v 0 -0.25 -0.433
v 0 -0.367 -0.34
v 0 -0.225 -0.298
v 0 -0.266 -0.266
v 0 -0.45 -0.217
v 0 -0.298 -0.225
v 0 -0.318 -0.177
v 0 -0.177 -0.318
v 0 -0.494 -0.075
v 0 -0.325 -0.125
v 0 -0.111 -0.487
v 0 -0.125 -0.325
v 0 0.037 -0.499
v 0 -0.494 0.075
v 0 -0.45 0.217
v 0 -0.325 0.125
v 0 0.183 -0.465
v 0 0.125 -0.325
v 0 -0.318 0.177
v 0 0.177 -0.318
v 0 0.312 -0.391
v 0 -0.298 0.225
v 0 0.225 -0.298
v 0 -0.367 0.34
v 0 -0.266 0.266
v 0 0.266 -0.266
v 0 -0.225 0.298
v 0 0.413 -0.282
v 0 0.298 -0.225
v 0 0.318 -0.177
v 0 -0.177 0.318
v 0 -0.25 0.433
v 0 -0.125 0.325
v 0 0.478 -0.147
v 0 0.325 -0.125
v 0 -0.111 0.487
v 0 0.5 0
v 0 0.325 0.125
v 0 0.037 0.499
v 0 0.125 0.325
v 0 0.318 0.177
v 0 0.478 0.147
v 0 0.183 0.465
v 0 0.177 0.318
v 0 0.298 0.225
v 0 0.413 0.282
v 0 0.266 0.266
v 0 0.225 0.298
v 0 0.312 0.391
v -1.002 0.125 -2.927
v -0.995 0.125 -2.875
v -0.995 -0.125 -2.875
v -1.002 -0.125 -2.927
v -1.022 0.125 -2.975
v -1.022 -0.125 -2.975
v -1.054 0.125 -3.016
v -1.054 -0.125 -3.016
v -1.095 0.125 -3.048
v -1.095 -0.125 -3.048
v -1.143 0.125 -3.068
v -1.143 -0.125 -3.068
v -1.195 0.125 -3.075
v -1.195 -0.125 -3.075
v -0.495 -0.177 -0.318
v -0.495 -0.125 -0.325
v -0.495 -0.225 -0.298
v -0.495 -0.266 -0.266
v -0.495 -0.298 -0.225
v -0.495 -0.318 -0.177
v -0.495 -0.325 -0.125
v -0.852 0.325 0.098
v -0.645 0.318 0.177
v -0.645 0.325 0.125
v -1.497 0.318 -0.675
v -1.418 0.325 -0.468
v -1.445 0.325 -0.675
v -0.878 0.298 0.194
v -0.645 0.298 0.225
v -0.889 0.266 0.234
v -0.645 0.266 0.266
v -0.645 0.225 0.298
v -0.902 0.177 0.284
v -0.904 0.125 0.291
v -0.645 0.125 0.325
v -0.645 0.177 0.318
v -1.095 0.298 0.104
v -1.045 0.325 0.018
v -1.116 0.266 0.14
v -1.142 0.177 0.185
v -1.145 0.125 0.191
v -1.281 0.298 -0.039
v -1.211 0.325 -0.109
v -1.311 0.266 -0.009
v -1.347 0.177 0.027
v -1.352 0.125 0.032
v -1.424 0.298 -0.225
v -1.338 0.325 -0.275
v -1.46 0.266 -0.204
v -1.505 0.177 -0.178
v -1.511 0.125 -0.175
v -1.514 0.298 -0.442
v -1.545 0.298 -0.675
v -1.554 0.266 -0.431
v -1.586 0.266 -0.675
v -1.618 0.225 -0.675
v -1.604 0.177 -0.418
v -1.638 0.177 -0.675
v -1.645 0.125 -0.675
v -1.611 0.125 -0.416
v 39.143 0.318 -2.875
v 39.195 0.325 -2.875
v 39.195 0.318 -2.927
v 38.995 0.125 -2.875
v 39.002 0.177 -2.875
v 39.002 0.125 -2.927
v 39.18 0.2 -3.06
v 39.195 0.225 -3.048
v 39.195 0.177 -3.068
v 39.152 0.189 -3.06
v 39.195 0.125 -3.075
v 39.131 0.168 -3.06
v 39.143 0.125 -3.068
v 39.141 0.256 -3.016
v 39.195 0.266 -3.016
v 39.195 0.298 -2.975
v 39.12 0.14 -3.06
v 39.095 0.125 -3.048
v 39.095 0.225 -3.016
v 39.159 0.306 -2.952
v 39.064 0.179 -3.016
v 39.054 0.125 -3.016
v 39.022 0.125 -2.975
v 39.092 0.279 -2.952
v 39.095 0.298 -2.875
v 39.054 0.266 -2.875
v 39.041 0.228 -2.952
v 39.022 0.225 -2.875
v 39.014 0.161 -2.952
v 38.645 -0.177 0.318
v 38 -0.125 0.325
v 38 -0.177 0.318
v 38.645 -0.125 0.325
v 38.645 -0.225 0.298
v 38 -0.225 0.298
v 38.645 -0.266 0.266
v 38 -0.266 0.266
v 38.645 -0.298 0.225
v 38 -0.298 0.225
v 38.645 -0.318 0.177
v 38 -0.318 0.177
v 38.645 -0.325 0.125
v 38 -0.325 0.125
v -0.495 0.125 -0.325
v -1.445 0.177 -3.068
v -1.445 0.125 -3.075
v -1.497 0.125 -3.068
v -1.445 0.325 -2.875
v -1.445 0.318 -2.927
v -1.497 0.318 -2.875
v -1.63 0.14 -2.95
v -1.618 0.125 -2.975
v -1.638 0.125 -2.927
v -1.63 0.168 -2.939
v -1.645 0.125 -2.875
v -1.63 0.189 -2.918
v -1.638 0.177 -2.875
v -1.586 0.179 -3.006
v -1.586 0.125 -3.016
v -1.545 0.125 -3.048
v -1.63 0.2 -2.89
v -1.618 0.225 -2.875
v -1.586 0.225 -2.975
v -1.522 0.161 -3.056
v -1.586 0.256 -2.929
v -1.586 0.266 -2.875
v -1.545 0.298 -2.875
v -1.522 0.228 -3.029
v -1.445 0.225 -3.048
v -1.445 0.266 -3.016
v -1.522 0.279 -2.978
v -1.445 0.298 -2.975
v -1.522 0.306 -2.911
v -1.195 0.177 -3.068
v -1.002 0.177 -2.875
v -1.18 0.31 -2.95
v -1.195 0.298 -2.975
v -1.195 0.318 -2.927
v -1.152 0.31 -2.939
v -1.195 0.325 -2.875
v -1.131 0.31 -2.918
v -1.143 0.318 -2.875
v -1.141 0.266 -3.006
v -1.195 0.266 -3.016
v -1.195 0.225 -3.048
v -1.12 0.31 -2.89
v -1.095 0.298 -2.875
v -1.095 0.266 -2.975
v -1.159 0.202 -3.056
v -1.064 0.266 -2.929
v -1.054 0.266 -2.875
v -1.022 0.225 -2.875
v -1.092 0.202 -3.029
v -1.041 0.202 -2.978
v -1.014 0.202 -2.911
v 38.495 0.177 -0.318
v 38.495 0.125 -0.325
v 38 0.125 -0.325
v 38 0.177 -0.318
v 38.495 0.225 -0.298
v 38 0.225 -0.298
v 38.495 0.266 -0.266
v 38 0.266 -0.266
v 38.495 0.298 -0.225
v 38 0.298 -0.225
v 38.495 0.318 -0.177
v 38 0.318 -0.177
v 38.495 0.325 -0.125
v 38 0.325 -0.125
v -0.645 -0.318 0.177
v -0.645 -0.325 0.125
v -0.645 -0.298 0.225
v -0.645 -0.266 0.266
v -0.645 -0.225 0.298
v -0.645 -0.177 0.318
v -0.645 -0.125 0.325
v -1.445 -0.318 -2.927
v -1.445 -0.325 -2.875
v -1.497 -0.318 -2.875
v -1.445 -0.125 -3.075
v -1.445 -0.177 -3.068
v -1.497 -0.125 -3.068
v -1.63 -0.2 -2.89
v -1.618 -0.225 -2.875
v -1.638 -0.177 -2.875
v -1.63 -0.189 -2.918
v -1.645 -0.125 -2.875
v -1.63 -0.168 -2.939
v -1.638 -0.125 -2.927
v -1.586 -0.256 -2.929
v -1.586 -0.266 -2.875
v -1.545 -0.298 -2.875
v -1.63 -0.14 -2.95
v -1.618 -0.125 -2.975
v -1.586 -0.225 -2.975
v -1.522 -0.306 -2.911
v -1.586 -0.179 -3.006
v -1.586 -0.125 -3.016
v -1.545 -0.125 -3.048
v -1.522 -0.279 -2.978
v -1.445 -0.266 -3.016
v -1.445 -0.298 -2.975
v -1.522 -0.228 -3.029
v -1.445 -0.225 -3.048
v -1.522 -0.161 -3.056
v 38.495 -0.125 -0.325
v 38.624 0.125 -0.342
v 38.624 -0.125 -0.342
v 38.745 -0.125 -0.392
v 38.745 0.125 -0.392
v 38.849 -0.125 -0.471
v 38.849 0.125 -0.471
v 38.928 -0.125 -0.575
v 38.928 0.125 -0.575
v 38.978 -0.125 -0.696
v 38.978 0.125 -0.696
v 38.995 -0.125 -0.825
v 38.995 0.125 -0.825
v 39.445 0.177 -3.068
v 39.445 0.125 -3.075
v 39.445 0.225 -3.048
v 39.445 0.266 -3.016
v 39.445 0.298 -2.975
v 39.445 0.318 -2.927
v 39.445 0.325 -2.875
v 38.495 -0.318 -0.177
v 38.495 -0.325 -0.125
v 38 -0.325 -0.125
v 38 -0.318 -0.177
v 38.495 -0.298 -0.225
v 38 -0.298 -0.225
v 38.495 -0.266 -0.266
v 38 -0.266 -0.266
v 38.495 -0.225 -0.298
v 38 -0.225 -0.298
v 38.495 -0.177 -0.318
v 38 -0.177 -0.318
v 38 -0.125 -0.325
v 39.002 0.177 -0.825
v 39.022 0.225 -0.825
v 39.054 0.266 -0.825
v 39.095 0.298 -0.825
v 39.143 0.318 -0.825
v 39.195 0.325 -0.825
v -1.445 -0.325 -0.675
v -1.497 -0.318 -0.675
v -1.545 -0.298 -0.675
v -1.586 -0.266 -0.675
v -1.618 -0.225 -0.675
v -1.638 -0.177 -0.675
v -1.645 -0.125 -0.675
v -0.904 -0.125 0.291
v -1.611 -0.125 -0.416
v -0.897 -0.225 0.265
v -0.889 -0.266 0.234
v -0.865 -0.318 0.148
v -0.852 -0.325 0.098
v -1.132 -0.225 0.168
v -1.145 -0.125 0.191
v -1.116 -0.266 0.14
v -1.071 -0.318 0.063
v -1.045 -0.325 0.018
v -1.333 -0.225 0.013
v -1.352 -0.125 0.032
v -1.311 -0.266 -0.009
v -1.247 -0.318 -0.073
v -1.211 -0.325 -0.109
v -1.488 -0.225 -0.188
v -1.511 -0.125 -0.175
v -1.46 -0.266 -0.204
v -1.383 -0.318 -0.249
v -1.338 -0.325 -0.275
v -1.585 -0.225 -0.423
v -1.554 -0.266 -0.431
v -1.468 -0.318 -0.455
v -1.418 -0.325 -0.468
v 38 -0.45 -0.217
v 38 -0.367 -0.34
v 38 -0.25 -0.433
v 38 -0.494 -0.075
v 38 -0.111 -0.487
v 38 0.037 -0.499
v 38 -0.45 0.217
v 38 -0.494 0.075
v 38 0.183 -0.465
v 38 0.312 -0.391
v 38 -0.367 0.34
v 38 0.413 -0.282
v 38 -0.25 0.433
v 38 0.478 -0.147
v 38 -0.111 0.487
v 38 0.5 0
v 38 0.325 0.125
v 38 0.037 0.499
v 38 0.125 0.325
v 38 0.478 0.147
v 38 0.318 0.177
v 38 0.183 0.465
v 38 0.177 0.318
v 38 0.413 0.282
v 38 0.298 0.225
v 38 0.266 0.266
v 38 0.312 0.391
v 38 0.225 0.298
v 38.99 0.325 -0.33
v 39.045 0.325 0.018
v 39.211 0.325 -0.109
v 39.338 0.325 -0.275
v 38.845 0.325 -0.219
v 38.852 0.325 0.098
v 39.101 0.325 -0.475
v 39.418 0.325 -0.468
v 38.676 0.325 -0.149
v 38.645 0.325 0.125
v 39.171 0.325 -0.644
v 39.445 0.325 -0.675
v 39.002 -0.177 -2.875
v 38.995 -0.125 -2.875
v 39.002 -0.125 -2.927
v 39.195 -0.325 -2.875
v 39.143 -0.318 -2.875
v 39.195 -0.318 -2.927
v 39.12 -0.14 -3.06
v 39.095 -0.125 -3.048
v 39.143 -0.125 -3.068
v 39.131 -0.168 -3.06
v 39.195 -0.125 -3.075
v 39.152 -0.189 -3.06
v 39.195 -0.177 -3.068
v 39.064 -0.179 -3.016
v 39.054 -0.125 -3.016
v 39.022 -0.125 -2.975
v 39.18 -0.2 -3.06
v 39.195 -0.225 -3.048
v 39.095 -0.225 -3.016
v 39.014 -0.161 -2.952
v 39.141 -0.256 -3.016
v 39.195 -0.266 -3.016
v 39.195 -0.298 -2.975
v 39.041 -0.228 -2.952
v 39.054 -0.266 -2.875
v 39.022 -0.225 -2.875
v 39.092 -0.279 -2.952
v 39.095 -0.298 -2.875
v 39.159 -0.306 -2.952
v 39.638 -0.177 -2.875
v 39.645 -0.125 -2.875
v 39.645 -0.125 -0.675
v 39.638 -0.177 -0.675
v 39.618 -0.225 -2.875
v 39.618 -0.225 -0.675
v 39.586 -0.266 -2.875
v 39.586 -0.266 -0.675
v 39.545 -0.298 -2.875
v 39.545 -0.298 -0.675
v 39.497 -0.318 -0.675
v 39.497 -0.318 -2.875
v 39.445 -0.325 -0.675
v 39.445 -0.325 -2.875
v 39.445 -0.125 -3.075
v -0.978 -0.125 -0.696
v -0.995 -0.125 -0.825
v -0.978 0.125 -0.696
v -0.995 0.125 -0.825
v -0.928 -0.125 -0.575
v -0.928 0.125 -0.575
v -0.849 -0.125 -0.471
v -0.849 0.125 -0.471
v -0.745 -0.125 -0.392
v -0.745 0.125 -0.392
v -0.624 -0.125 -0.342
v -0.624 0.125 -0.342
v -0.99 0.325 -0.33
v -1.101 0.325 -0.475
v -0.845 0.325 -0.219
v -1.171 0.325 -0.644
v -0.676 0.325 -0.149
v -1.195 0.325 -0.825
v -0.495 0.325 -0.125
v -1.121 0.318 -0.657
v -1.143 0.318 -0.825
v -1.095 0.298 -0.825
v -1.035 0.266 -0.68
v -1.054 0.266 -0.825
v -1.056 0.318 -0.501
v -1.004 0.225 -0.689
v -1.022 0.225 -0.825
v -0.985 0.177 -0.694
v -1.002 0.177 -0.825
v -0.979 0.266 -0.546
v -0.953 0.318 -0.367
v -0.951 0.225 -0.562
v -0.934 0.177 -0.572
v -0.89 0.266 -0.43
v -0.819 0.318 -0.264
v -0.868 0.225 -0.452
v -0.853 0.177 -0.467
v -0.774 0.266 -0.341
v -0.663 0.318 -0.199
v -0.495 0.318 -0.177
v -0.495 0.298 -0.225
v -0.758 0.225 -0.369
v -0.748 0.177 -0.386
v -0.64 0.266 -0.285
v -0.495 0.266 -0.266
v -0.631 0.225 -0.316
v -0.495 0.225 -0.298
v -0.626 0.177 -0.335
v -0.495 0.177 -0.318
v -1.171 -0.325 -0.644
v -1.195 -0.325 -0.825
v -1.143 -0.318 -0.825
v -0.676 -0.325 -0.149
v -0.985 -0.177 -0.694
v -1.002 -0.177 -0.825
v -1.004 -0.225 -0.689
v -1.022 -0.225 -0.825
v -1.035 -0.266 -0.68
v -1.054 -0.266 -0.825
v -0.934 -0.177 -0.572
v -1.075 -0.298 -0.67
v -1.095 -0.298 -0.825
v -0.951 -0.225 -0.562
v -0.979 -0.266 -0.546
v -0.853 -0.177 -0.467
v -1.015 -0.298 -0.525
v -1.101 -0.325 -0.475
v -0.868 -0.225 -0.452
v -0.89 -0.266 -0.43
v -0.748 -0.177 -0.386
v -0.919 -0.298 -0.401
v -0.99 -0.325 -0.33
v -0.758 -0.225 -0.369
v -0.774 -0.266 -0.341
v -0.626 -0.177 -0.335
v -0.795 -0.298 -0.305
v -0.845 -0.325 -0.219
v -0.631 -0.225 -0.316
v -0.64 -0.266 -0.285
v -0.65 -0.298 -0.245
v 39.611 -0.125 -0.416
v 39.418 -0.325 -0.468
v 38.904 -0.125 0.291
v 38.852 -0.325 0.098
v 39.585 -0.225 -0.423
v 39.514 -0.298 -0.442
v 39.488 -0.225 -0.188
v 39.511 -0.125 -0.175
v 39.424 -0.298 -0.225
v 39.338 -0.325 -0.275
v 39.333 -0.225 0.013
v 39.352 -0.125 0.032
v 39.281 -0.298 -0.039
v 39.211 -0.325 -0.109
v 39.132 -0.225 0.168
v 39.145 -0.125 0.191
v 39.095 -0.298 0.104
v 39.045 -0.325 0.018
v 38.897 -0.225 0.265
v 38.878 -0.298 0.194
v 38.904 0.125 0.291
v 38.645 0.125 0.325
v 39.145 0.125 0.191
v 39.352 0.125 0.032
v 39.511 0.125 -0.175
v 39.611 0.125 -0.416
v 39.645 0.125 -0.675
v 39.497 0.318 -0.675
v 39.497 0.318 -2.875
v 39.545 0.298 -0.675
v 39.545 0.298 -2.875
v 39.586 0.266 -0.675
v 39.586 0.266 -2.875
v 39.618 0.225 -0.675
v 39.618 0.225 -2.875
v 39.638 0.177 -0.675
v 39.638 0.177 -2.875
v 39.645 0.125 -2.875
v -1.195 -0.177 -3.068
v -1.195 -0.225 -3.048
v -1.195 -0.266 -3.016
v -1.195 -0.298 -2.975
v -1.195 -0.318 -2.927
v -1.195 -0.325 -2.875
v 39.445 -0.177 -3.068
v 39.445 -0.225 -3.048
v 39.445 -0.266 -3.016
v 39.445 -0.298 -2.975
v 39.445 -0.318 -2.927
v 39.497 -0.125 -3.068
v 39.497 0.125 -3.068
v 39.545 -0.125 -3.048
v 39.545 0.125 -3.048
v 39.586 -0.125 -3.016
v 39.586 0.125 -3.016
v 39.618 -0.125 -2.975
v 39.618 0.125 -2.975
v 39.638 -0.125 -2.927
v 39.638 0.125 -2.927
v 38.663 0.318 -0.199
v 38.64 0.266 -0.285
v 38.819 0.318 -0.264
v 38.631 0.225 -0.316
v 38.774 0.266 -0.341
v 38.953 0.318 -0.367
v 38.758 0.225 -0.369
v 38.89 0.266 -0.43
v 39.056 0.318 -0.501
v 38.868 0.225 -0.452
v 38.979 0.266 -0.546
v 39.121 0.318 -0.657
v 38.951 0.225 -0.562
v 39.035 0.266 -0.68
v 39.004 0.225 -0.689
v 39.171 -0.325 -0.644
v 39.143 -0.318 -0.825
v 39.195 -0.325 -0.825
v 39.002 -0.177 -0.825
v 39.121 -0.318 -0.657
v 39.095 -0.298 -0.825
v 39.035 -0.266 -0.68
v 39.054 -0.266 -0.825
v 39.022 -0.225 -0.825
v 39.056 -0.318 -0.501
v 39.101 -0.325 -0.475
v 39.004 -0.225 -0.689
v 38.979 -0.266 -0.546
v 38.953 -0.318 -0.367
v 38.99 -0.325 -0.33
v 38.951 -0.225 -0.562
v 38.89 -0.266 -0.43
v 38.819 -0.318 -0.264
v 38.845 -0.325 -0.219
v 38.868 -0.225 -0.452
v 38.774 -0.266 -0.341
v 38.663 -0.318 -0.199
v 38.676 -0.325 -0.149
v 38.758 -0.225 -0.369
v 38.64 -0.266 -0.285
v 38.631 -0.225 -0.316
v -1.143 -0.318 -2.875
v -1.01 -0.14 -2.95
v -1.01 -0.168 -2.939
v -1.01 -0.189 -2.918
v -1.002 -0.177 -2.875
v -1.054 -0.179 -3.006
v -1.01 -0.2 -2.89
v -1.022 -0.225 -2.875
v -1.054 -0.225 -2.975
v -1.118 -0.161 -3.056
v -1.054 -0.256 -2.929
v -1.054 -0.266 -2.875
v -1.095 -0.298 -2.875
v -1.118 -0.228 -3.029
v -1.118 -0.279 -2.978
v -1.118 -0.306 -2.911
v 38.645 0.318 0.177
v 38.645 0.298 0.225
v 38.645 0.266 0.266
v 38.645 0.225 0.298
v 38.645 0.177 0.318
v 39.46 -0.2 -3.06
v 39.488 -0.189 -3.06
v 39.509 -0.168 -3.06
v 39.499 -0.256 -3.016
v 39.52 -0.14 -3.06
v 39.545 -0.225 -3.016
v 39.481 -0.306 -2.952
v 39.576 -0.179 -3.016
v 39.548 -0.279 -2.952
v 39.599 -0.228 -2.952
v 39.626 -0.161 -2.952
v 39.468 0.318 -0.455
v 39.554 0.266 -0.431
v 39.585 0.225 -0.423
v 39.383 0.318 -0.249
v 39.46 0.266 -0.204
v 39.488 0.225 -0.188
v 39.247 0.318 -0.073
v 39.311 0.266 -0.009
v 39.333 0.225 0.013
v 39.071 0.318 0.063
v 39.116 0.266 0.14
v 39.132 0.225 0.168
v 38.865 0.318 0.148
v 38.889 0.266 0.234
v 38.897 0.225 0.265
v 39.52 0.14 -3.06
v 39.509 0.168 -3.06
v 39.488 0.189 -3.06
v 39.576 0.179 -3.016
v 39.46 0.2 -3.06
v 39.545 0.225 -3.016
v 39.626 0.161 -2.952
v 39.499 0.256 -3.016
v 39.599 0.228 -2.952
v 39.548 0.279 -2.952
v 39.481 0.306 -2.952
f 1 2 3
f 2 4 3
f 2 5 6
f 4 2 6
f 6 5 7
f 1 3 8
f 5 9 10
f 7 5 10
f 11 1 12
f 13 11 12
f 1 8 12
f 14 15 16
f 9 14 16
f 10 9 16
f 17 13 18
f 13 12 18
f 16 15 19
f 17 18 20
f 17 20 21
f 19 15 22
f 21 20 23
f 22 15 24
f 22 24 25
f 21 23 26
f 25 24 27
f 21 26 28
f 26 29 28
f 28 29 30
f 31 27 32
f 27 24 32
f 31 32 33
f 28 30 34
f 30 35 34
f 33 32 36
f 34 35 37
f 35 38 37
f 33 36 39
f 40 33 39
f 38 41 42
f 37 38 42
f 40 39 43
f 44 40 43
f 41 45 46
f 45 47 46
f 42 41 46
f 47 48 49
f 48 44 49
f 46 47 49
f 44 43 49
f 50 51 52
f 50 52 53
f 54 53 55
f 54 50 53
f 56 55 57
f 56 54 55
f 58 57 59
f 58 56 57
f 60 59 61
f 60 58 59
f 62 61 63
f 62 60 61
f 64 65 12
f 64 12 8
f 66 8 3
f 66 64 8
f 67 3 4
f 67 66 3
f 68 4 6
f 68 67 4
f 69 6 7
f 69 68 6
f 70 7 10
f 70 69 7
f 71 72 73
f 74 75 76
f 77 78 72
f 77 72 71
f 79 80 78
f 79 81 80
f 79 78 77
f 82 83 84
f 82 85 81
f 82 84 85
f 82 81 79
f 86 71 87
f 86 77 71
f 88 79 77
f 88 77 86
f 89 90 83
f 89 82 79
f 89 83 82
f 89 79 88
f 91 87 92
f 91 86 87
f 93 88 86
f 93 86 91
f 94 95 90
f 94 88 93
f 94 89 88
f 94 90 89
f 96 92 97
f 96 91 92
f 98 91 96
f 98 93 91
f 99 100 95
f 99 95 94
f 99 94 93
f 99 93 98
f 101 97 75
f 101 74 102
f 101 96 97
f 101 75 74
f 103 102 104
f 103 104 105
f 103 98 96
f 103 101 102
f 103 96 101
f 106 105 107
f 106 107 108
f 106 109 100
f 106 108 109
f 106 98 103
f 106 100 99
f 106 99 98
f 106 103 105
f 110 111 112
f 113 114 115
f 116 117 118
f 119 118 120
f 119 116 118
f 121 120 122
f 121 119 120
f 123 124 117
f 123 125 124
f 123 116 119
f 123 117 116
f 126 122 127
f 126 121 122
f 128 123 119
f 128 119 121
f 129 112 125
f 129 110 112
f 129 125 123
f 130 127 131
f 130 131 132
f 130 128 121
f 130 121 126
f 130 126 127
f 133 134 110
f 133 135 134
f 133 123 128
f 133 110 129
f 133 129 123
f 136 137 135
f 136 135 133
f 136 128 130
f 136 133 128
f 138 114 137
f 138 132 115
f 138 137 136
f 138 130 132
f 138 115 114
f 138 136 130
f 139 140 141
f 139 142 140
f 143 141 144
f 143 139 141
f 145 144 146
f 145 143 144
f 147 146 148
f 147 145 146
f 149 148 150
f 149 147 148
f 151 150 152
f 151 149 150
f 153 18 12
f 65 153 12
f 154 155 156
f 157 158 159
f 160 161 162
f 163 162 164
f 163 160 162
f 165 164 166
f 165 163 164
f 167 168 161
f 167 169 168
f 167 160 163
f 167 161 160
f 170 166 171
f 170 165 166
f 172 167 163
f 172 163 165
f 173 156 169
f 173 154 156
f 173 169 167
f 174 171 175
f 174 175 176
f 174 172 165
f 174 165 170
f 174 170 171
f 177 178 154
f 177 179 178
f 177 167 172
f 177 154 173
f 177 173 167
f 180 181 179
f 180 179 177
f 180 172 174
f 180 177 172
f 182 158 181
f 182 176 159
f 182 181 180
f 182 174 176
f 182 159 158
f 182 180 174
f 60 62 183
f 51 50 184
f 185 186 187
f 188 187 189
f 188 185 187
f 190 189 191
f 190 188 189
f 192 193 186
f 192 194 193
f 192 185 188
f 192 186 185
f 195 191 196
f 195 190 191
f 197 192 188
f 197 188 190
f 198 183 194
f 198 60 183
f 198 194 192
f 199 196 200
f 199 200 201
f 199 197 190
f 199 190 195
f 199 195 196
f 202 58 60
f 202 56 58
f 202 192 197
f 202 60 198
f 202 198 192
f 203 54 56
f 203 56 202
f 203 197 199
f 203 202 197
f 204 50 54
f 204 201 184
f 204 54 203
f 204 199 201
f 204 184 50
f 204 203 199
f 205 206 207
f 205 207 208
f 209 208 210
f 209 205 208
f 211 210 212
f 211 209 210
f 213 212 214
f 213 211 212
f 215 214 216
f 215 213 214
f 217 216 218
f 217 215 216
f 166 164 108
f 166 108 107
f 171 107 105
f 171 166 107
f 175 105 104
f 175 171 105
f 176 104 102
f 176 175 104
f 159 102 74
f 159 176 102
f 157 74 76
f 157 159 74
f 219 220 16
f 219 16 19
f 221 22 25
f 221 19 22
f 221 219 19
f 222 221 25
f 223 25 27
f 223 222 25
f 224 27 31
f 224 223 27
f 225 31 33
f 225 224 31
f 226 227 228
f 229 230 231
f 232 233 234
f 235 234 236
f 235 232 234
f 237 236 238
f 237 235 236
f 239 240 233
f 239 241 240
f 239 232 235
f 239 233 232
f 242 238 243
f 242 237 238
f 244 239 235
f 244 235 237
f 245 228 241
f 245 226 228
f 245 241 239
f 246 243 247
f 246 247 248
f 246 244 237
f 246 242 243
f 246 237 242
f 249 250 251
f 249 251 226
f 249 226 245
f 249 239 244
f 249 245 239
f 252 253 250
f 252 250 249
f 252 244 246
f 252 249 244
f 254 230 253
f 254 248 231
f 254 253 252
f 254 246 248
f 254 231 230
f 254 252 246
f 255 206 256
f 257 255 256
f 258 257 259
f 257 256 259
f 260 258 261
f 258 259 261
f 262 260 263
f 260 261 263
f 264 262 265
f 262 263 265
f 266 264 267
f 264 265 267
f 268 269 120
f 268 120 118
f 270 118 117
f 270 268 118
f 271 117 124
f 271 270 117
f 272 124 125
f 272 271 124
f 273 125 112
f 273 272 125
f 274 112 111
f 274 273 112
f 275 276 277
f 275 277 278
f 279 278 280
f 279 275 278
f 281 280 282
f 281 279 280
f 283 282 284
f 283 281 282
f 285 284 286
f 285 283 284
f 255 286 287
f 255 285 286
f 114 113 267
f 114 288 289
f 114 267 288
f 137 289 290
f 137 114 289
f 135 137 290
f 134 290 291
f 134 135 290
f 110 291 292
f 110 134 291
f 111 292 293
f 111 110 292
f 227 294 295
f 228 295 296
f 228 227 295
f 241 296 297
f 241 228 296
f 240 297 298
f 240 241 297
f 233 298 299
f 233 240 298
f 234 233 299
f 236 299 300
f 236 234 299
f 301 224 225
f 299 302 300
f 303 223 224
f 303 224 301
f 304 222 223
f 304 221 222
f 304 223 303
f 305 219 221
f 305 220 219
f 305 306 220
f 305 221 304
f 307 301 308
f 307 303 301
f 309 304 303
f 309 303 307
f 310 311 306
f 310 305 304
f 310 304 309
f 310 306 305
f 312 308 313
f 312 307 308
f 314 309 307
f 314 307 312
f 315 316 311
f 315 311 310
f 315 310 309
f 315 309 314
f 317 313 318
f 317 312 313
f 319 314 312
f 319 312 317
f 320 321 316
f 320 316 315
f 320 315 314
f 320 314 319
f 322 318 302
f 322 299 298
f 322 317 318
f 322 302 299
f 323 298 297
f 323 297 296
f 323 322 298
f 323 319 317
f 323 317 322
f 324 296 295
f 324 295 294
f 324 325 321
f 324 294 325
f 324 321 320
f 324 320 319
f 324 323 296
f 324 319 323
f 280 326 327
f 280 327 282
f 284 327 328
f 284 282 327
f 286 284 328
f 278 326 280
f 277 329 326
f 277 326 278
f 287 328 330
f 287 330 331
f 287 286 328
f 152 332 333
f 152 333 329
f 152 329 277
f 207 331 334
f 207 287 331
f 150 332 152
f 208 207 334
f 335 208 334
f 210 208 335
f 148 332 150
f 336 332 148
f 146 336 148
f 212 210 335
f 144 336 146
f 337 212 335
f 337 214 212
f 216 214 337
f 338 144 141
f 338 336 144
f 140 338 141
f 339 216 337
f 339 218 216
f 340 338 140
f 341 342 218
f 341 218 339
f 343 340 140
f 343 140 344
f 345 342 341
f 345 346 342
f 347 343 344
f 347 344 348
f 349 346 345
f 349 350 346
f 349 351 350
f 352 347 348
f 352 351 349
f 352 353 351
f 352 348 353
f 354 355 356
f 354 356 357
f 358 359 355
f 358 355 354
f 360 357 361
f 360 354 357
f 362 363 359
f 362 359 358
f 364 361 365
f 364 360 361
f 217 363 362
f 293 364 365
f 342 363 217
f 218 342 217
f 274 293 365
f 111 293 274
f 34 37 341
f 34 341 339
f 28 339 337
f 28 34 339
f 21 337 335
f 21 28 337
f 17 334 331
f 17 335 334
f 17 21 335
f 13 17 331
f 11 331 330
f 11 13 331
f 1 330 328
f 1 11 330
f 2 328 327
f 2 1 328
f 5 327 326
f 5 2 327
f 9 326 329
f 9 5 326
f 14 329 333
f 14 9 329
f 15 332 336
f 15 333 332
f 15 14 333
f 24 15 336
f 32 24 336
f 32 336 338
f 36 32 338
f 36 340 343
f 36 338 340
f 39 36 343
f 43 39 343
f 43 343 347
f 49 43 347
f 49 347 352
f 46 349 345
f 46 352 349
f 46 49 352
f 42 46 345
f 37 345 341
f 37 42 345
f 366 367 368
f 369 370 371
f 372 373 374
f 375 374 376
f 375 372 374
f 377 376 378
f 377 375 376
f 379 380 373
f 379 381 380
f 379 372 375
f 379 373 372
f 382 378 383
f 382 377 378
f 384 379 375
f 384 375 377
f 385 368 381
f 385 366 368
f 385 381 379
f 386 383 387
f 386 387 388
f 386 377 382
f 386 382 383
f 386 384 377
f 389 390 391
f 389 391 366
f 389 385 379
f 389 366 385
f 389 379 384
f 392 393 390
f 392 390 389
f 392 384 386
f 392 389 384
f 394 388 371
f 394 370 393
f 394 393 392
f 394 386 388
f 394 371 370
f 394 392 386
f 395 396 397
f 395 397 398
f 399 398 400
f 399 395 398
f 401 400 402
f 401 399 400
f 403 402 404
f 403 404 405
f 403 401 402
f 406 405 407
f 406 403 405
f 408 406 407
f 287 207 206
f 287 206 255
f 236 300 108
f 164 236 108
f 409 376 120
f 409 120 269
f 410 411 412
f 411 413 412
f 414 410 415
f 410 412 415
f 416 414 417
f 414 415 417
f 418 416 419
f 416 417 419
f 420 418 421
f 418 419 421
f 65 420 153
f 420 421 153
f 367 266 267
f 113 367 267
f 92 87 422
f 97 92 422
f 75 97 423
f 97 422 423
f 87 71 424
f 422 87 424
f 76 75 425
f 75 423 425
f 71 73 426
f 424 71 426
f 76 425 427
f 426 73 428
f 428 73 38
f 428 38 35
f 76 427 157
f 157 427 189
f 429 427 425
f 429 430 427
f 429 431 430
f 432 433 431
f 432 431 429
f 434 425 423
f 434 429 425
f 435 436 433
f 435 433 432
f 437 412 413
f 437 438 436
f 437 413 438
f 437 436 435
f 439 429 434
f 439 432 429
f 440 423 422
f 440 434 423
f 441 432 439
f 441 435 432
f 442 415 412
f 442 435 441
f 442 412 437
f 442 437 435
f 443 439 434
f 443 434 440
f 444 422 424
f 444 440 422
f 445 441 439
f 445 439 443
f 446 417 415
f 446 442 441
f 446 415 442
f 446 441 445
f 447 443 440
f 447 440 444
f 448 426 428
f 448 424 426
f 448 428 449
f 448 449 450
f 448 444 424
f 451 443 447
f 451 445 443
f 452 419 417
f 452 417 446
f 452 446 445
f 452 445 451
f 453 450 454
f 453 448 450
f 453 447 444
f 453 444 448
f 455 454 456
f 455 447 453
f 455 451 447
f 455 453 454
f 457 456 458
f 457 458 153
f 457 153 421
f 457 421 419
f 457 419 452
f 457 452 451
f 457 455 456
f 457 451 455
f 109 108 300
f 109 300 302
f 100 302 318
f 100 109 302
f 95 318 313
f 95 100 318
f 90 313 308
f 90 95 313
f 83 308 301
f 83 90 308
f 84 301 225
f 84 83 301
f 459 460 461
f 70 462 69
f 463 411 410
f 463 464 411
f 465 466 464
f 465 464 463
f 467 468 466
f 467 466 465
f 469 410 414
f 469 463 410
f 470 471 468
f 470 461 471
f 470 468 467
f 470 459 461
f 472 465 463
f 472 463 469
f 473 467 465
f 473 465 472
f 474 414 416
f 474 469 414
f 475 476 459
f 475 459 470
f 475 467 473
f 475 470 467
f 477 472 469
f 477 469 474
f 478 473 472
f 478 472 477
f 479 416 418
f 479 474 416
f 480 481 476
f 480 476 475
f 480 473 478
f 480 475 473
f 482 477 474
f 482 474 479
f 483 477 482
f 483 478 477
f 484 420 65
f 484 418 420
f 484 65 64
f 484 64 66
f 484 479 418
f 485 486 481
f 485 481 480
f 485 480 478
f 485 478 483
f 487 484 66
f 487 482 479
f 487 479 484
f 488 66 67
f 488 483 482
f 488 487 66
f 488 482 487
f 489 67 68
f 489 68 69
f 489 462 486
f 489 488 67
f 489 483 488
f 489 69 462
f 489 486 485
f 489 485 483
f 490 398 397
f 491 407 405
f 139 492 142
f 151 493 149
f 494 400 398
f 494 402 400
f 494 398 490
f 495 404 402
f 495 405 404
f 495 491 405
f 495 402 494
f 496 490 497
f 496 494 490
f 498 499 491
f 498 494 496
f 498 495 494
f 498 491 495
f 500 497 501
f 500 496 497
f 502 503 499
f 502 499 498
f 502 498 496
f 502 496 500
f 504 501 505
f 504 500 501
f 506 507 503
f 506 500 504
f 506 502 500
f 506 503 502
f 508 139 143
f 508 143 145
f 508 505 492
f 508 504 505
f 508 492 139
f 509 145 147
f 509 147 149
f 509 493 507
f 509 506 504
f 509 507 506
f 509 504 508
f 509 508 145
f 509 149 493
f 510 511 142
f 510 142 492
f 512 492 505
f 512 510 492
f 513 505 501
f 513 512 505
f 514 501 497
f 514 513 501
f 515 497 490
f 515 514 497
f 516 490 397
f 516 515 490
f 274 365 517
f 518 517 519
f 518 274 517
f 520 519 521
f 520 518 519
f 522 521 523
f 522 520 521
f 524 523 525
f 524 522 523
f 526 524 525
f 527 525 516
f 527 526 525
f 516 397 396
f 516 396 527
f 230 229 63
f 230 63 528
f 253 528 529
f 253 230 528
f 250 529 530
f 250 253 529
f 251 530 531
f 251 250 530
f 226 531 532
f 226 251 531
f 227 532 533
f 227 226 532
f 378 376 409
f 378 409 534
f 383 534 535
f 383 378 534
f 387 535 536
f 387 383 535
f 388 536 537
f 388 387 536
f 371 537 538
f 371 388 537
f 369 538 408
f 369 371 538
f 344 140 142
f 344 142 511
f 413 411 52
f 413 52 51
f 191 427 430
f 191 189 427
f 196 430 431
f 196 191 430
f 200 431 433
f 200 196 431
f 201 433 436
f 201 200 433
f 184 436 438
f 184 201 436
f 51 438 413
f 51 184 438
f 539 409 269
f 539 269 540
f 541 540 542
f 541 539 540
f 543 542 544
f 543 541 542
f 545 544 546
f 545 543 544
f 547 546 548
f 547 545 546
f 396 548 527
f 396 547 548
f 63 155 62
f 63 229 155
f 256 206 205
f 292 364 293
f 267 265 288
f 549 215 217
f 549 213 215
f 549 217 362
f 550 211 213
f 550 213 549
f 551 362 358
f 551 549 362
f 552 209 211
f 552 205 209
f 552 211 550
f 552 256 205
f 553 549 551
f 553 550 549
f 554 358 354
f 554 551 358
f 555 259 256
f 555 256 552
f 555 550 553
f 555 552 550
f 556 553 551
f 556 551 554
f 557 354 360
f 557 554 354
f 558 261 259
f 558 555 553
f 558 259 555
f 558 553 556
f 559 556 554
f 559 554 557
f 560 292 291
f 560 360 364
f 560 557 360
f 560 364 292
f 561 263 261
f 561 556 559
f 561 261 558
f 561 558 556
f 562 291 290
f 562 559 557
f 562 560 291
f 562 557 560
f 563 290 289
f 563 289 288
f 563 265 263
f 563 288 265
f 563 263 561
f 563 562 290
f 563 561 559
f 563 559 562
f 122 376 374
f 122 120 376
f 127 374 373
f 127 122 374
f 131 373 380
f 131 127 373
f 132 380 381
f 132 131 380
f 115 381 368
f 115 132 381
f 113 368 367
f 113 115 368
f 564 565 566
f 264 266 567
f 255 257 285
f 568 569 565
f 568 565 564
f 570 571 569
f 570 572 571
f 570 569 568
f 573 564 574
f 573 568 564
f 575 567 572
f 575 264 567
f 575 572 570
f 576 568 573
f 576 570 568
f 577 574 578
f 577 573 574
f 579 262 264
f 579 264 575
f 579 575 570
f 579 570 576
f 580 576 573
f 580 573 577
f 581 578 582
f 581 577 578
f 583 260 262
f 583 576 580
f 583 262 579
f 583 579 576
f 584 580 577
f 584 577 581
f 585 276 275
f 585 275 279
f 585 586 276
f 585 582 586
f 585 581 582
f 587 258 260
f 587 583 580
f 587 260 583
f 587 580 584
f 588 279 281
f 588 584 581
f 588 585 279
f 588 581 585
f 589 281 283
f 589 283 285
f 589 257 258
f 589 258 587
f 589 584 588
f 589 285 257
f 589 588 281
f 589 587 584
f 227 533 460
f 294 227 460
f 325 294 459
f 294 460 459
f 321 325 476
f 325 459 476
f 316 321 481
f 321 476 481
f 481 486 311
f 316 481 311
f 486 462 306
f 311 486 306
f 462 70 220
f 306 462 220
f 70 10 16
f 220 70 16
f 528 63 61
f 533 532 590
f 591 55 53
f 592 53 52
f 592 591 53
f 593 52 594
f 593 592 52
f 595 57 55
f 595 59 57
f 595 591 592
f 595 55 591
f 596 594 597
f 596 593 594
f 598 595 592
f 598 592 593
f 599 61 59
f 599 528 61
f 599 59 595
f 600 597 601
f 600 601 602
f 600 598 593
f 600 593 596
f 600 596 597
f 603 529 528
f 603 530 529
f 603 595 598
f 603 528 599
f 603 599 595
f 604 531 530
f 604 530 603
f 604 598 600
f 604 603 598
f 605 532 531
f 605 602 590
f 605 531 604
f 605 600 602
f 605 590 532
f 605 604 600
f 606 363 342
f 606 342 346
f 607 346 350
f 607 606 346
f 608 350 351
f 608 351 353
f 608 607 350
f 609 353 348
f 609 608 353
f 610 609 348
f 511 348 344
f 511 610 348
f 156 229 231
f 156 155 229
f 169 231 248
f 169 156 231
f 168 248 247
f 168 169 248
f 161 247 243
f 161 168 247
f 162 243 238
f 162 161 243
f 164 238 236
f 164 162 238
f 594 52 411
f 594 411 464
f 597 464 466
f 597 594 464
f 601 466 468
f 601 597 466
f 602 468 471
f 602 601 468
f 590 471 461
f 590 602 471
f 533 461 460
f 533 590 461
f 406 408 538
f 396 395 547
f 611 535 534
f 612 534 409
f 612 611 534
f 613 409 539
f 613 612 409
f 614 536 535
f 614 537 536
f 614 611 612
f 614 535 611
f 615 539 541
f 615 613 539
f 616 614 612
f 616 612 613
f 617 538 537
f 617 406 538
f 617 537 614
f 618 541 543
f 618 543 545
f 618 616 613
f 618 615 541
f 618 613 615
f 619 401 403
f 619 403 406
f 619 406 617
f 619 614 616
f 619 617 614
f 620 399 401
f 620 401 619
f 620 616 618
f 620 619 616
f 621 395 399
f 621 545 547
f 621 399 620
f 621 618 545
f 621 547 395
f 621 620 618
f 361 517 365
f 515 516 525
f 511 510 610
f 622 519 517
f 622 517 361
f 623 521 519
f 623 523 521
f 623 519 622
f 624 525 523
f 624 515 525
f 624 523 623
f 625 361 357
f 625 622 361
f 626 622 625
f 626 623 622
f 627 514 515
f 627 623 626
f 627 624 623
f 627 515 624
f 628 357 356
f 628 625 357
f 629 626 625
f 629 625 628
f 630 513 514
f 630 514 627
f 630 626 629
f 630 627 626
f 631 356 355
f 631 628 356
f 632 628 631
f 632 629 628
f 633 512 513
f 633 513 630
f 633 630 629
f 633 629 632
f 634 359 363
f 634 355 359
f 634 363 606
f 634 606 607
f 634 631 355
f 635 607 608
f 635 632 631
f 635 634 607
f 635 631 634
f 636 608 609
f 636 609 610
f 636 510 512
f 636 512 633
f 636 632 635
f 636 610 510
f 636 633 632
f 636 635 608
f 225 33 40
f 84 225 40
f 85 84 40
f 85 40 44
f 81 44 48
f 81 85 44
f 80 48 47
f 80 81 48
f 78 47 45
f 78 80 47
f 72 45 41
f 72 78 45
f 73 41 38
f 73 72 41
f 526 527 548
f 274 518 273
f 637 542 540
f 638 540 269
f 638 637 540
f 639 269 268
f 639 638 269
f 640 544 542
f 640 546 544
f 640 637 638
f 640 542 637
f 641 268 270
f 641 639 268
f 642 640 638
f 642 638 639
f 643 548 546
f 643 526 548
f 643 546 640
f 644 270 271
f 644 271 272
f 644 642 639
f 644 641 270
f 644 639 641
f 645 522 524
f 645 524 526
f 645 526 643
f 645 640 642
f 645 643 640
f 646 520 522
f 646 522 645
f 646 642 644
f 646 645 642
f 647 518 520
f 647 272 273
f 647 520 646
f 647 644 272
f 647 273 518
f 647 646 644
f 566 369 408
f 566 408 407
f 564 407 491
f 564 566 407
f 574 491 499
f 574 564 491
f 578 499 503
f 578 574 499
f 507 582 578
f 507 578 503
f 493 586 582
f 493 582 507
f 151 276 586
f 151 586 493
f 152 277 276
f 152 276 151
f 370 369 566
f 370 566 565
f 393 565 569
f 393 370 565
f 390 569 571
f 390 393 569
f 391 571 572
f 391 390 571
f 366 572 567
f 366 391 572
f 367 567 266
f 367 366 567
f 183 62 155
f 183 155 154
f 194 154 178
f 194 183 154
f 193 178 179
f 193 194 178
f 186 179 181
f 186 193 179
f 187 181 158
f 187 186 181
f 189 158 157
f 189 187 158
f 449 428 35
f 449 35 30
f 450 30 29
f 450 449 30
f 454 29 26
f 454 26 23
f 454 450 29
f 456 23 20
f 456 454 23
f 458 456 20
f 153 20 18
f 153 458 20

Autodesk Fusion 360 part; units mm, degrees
sketch "Sketch1" plane through (0, 0, 0) normal (1, 0, 0) x (0, 1, 0)
  circle A0 centre (0, 0) radius 0.5
  line L0 (0.325, -0.325) -> (-0.325, -0.325)
  line L1 (-0.325, -0.325) -> (-0.325, 0.325)
  line L2 (-0.325, 0.325) -> (0.325, 0.325)
  line L3 (0.325, 0.325) -> (0.325, -0.325)
  line L4 (0.325, -0.325) -> (-0.325, 0.325) construction
  line L5 (-0.325, -0.325) -> (0.325, 0.325) construction
  dimension "d1" = 1
  dimension "d2" = 0.65
  dimension "d3" = 0.65
extrude "Extrude1" add sketch "Sketch1" along normal blind 38 contours A0 | L0 L1 L2 L3
sketch "Sketch2" plane through (38, 0, 0) normal (1, 0, 0) x (0, 1, 0)
  circle A0 centre (0, 0) radius 0.5
  line L0 (0.325, -0.325) -> (-0.325, -0.325)
  line L1 (-0.325, -0.325) -> (-0.325, 0.325)
  line L2 (-0.325, 0.325) -> (0.325, 0.325)
  line L3 (0.325, 0.325) -> (0.325, -0.325)
  line L4 (0.325, -0.325) -> (-0.325, 0.325) construction
  line L5 (-0.325, -0.325) -> (0.325, 0.325) construction
  dimension "d8" = 0.65
  dimension "d9" = 0.65
extrude "Extrude2" add sketch "Sketch2" along normal blind 1.645 contours L0 L1 L2 L3
extrude "Extrude3" add sketch "Sketch1" against normal blind 1.645 contours L0 L1 L2 L3
sketch "Sketch3" plane through (0, 0, -0.325) normal (0, 0, -1) x (1, 0, 0)
  line L0 (38, 0.325) -> (38, -0.325)
  line L1 (38, -0.325) -> (39.645, -0.325)
  line L2 (39.645, -0.325) -> (39.645, 0.325)
  line L3 (39.645, 0.325) -> (38, 0.325)
  line L4 (39.645, 0.325) -> (38.995, 0.325)
  line L5 (38.995, 0.325) -> (38.995, -0.325)
  line L6 (38.995, -0.325) -> (39.645, -0.325)
  line L7 (39.645, -0.325) -> (39.645, 0.325)
  line L8 (39.645, 0.325) -> (38.995, -0.325) construction
  line L9 (38.995, 0.325) -> (39.645, -0.325) construction
  point P0 (39.32, 0)
  dimension "d14" = 0.65
  dimension "d15" = 0.65
sketch "Sketch4" plane through (0, 0, -0.325) normal (0, 0, -1) x (1, 0, 0)
  line L0 (0, -0.325) -> (0, 0.325)
  line L1 (0, 0.325) -> (-1.645, 0.325)
  line L2 (-1.645, 0.325) -> (-1.645, -0.325)
  line L3 (-1.645, -0.325) -> (0, -0.325)
  line L4 (-0.995, -0.325) -> (-1.645, -0.325)
  line L5 (-1.645, -0.325) -> (-1.645, 0.325)
  line L6 (-1.645, 0.325) -> (-0.995, 0.325)
  line L7 (-0.995, 0.325) -> (-0.995, -0.325)
  line L8 (-0.995, -0.325) -> (-1.645, 0.325) construction
  line L9 (-1.645, -0.325) -> (-0.995, 0.325) construction
  point P0 (-1.32, 0)
  dimension "d17" = 0.65
  dimension "d18" = 0.65
extrude "Extrude4" add sketch "Sketch4" sketch "Sketch3" along normal blind 2.75 contours L1 L2 L3 L4 L5 L6 L7 of sketch 2 contours L1 L2 L3 L4 L5 L6 L7
fillet "Fillet1" radius 0.5 2 edges at (-0.995, 0, -0.325) (38.995, 0, -0.325)
fillet "Fillet2" radius 1 2 edges at (-1.645, 0, 0.325) (39.645, 0, 0.325)
fillet "Fillet3" radius 0.2 32 edges at (-1.32, -0.325, -3.075) (-0.995, 0, -3.075) (-1.32, 0.325, -3.075) (-1.645, 0, -3.075) (-0.8486, -0.325, -0.4714) (-0.995, -0.325, -1.95) (-0.2475, -0.325, -0.325) (-0.3225, -0.325, 0.325) (-1.3521, -0.325, 0.0321) (-1.645, -0.325, -1.875) (-0.3225, 0.325, 0.325) (-1.3521, 0.325, 0.0321) (-1.645, 0.325, -1.875) (-0.8486, 0.325, -0.4714) (-0.2475, 0.325, -0.325) (-0.995, 0.325, -1.95) (38.3225, -0.325, 0.325) (39.3521, -0.325, 0.0321) (39.645, -0.325, -1.875) (38.995, -0.325, -1.95) (38.8486, -0.325, -0.4714) (38.2475, -0.325, -0.325) (39.645, 0.325, -1.875) (39.3521, 0.325, 0.0321) (38.3225, 0.325, 0.325) (38.8486, 0.325, -0.4714) (38.995, 0.325, -1.95) (38.2475, 0.325, -0.325) (39.32, 0.325, -3.075) (39.645, 0, -3.075) (39.32, -0.325, -3.075) (38.995, 0, -3.075)
equation "d1 = width"
equation "d2 = d3"
equation "d3 = d1 * 0.65"
equation "width = 1 mm"
equation "baseLenght = 38 mm"
equation "d6 = baseLenght"
equation "d8 = width * 0.65"
equation "d9 = d8"
equation "d10 = ( ( 2.54 * ceil(( baseLenght + 1.3 * width ) / 2.54 mm) ) * 1 mm + 0.65 * width - baseLenght ) / 2"
equation "d12 = -( ( 2.54 * ceil(( baseLenght + 1.3 * width ) / 2.54 mm) ) * 1 mm + 0.65 * width - baseLenght ) / 2"
equation "d14 = width * 0.65"
equation "d15 = d14"
equation "d17 = width * 0.65"
equation "d18 = d17"
equation "d26 = 0.2 * width"
